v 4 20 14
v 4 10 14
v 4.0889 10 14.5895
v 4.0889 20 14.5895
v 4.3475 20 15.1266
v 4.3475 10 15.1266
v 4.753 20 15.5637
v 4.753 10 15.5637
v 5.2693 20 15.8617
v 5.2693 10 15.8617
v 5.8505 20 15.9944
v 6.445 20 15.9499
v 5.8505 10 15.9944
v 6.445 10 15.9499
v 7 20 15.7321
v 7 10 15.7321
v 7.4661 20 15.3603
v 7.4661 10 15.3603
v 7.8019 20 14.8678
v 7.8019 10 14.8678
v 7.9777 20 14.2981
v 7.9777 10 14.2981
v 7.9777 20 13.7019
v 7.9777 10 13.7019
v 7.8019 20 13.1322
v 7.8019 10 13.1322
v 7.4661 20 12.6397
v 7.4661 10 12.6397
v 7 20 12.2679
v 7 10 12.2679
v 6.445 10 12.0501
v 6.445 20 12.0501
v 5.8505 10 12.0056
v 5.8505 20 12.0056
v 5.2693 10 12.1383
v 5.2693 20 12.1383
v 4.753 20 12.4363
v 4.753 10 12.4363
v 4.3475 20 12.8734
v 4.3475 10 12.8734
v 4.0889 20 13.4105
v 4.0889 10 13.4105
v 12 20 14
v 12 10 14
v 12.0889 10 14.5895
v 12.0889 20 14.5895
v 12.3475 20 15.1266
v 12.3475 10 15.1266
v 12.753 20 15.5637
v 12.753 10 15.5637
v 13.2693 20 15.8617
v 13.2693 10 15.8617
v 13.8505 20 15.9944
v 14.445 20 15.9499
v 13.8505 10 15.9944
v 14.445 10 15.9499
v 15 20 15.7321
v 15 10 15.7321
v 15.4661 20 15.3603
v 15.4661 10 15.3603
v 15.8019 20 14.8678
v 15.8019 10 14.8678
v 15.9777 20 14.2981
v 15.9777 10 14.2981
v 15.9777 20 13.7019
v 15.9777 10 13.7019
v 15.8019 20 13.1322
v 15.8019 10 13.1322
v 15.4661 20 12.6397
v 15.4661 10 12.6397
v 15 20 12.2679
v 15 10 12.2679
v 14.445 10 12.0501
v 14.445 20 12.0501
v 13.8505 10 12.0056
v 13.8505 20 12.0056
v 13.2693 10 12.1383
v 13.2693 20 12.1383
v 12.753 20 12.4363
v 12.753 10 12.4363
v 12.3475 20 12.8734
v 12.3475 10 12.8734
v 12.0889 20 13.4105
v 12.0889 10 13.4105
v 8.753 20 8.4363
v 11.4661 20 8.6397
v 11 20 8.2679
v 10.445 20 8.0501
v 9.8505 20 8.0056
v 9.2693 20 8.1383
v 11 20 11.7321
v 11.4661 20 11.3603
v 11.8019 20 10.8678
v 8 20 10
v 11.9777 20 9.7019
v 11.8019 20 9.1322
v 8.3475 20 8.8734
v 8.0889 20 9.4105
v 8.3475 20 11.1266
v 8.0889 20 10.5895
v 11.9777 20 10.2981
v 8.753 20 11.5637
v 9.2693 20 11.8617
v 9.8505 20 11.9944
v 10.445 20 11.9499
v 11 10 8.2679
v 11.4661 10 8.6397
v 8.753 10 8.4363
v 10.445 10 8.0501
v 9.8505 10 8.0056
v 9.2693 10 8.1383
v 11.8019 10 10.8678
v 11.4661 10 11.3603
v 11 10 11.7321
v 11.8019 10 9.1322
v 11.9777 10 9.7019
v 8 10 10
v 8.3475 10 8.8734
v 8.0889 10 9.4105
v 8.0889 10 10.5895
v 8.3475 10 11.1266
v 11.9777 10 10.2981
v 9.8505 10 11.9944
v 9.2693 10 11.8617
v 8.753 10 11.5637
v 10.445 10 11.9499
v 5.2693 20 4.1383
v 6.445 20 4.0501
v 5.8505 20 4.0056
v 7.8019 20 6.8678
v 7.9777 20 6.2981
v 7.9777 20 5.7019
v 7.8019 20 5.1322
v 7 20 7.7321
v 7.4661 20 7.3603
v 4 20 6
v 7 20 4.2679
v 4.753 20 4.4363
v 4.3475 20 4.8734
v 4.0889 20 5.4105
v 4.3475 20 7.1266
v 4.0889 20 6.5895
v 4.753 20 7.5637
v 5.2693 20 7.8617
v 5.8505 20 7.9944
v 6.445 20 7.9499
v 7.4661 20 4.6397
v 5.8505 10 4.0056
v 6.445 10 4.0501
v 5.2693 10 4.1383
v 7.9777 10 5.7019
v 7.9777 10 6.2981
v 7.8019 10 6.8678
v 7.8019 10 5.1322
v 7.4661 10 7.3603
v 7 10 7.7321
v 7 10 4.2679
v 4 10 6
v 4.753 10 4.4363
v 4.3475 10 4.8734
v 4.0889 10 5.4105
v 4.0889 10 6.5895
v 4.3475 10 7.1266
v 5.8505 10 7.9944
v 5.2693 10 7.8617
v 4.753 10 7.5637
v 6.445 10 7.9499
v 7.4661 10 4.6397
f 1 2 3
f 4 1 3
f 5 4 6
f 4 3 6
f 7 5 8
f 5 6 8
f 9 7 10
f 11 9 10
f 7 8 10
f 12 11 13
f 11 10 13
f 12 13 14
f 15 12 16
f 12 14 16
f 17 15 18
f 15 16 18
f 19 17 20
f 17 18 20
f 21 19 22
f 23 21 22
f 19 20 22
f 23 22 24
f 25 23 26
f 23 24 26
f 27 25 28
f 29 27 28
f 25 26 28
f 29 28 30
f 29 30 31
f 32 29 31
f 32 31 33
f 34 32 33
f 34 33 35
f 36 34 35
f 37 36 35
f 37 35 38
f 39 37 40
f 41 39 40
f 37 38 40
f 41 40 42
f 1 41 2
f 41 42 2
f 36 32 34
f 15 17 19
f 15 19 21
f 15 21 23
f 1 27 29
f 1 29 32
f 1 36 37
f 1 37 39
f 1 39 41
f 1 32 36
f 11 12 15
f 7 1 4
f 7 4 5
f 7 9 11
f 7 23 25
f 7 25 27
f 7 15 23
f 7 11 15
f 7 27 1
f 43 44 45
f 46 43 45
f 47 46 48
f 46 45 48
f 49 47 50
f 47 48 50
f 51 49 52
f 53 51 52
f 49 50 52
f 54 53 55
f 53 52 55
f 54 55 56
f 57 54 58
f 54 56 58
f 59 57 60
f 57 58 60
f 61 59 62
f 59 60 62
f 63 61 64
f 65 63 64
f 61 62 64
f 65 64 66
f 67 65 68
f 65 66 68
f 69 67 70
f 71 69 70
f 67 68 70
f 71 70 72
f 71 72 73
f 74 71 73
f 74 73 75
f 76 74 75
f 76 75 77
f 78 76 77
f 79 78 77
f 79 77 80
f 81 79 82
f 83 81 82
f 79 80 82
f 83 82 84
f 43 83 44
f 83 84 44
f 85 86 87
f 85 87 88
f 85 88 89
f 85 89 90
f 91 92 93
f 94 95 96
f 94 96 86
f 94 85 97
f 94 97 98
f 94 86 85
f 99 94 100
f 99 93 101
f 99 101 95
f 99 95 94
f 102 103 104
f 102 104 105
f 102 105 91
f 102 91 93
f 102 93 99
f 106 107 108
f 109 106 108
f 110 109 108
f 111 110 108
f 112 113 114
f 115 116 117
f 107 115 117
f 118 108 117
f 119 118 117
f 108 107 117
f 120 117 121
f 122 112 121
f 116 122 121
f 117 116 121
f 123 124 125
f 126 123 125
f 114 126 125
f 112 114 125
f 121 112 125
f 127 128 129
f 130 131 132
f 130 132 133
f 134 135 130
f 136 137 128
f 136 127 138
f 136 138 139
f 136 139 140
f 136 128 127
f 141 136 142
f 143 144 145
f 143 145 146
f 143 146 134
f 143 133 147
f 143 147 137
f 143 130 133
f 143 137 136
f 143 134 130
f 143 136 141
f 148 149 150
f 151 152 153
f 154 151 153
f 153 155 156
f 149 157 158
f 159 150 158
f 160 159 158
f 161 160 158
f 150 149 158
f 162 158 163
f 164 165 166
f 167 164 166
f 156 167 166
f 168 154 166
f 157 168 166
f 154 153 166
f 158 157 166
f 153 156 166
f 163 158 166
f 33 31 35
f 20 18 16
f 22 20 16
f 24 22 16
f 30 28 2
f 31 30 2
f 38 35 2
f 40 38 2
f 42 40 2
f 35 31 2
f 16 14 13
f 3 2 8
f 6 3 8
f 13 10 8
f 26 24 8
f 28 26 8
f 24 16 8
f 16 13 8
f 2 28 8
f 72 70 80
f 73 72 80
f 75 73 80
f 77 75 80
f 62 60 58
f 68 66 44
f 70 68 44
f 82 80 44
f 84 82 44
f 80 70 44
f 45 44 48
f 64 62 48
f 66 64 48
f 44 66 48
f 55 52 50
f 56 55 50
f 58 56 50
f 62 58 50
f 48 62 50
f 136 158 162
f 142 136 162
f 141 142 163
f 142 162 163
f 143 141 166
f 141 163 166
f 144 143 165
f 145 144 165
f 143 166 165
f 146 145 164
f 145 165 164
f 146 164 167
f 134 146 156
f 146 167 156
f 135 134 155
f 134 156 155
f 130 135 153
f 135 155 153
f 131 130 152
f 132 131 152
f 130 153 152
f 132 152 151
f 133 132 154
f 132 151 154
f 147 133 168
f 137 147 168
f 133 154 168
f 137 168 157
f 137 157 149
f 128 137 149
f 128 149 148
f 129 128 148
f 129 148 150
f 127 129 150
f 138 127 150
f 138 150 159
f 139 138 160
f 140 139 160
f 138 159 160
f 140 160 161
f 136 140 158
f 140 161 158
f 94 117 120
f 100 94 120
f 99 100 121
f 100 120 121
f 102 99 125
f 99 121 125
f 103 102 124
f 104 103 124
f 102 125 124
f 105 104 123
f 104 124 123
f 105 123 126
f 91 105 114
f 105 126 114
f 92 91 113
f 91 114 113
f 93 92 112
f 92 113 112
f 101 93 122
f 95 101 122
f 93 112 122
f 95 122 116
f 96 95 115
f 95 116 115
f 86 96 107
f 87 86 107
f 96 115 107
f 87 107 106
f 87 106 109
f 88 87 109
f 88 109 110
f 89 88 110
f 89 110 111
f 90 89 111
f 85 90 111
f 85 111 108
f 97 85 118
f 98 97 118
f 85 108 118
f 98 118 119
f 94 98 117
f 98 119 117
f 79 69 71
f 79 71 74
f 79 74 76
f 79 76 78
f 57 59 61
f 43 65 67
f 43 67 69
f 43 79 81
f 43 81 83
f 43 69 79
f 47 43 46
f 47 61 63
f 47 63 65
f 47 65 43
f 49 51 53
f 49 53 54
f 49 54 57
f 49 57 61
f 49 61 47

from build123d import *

# Parameters (mm, degrees)
CYLINDER011_R     = 2
CYLINDER011_DEPTH = 10
CYLINDER010_R     = 2
CYLINDER010_DEPTH = 10
CYLINDER009_R     = 2
CYLINDER009_DEPTH = 10
CYLINDER008_R     = 2
CYLINDER008_DEPTH = 10


with BuildPart() as cilindre011:
    # Cylinder011 → Cylinder011 (new body)
    with BuildSketch(Plane(origin=(14, 10, 14), x_dir=(-1, 0, 0), z_dir=(0, 1, 0))):
        Circle(CYLINDER011_R)
    extrude(amount=CYLINDER011_DEPTH)


with BuildPart() as cilindre010:
    # Cylinder010 → Cylinder010 (new body)
    with BuildSketch(Plane(origin=(6, 10, 14), x_dir=(-1, 0, 0), z_dir=(0, 1, 0))):
        Circle(CYLINDER010_R)
    extrude(amount=CYLINDER010_DEPTH)


with BuildPart() as cilindre009:
    # Cylinder009 → Cylinder009 (new body)
    with BuildSketch(Plane(origin=(6, 10, 6), x_dir=(-1, 0, 0), z_dir=(0, 1, 0))):
        Circle(CYLINDER009_R)
    extrude(amount=CYLINDER009_DEPTH)


with BuildPart() as fusion005:
    # Cylinder008 → Cylinder008 (new body)
    with BuildSketch(Plane(origin=(10, 10, 10), x_dir=(-1, 0, 0), z_dir=(0, 1, 0))):
        Circle(CYLINDER008_R)
    extrude(amount=CYLINDER008_DEPTH)

    # Fusion003: union Cilindre009
    add(cilindre009.part)

    # Fusion004: union Cilindre010
    add(cilindre010.part)

    # Fusion005: union Cilindre011
    add(cilindre011.part)


solid = fusion005.part
